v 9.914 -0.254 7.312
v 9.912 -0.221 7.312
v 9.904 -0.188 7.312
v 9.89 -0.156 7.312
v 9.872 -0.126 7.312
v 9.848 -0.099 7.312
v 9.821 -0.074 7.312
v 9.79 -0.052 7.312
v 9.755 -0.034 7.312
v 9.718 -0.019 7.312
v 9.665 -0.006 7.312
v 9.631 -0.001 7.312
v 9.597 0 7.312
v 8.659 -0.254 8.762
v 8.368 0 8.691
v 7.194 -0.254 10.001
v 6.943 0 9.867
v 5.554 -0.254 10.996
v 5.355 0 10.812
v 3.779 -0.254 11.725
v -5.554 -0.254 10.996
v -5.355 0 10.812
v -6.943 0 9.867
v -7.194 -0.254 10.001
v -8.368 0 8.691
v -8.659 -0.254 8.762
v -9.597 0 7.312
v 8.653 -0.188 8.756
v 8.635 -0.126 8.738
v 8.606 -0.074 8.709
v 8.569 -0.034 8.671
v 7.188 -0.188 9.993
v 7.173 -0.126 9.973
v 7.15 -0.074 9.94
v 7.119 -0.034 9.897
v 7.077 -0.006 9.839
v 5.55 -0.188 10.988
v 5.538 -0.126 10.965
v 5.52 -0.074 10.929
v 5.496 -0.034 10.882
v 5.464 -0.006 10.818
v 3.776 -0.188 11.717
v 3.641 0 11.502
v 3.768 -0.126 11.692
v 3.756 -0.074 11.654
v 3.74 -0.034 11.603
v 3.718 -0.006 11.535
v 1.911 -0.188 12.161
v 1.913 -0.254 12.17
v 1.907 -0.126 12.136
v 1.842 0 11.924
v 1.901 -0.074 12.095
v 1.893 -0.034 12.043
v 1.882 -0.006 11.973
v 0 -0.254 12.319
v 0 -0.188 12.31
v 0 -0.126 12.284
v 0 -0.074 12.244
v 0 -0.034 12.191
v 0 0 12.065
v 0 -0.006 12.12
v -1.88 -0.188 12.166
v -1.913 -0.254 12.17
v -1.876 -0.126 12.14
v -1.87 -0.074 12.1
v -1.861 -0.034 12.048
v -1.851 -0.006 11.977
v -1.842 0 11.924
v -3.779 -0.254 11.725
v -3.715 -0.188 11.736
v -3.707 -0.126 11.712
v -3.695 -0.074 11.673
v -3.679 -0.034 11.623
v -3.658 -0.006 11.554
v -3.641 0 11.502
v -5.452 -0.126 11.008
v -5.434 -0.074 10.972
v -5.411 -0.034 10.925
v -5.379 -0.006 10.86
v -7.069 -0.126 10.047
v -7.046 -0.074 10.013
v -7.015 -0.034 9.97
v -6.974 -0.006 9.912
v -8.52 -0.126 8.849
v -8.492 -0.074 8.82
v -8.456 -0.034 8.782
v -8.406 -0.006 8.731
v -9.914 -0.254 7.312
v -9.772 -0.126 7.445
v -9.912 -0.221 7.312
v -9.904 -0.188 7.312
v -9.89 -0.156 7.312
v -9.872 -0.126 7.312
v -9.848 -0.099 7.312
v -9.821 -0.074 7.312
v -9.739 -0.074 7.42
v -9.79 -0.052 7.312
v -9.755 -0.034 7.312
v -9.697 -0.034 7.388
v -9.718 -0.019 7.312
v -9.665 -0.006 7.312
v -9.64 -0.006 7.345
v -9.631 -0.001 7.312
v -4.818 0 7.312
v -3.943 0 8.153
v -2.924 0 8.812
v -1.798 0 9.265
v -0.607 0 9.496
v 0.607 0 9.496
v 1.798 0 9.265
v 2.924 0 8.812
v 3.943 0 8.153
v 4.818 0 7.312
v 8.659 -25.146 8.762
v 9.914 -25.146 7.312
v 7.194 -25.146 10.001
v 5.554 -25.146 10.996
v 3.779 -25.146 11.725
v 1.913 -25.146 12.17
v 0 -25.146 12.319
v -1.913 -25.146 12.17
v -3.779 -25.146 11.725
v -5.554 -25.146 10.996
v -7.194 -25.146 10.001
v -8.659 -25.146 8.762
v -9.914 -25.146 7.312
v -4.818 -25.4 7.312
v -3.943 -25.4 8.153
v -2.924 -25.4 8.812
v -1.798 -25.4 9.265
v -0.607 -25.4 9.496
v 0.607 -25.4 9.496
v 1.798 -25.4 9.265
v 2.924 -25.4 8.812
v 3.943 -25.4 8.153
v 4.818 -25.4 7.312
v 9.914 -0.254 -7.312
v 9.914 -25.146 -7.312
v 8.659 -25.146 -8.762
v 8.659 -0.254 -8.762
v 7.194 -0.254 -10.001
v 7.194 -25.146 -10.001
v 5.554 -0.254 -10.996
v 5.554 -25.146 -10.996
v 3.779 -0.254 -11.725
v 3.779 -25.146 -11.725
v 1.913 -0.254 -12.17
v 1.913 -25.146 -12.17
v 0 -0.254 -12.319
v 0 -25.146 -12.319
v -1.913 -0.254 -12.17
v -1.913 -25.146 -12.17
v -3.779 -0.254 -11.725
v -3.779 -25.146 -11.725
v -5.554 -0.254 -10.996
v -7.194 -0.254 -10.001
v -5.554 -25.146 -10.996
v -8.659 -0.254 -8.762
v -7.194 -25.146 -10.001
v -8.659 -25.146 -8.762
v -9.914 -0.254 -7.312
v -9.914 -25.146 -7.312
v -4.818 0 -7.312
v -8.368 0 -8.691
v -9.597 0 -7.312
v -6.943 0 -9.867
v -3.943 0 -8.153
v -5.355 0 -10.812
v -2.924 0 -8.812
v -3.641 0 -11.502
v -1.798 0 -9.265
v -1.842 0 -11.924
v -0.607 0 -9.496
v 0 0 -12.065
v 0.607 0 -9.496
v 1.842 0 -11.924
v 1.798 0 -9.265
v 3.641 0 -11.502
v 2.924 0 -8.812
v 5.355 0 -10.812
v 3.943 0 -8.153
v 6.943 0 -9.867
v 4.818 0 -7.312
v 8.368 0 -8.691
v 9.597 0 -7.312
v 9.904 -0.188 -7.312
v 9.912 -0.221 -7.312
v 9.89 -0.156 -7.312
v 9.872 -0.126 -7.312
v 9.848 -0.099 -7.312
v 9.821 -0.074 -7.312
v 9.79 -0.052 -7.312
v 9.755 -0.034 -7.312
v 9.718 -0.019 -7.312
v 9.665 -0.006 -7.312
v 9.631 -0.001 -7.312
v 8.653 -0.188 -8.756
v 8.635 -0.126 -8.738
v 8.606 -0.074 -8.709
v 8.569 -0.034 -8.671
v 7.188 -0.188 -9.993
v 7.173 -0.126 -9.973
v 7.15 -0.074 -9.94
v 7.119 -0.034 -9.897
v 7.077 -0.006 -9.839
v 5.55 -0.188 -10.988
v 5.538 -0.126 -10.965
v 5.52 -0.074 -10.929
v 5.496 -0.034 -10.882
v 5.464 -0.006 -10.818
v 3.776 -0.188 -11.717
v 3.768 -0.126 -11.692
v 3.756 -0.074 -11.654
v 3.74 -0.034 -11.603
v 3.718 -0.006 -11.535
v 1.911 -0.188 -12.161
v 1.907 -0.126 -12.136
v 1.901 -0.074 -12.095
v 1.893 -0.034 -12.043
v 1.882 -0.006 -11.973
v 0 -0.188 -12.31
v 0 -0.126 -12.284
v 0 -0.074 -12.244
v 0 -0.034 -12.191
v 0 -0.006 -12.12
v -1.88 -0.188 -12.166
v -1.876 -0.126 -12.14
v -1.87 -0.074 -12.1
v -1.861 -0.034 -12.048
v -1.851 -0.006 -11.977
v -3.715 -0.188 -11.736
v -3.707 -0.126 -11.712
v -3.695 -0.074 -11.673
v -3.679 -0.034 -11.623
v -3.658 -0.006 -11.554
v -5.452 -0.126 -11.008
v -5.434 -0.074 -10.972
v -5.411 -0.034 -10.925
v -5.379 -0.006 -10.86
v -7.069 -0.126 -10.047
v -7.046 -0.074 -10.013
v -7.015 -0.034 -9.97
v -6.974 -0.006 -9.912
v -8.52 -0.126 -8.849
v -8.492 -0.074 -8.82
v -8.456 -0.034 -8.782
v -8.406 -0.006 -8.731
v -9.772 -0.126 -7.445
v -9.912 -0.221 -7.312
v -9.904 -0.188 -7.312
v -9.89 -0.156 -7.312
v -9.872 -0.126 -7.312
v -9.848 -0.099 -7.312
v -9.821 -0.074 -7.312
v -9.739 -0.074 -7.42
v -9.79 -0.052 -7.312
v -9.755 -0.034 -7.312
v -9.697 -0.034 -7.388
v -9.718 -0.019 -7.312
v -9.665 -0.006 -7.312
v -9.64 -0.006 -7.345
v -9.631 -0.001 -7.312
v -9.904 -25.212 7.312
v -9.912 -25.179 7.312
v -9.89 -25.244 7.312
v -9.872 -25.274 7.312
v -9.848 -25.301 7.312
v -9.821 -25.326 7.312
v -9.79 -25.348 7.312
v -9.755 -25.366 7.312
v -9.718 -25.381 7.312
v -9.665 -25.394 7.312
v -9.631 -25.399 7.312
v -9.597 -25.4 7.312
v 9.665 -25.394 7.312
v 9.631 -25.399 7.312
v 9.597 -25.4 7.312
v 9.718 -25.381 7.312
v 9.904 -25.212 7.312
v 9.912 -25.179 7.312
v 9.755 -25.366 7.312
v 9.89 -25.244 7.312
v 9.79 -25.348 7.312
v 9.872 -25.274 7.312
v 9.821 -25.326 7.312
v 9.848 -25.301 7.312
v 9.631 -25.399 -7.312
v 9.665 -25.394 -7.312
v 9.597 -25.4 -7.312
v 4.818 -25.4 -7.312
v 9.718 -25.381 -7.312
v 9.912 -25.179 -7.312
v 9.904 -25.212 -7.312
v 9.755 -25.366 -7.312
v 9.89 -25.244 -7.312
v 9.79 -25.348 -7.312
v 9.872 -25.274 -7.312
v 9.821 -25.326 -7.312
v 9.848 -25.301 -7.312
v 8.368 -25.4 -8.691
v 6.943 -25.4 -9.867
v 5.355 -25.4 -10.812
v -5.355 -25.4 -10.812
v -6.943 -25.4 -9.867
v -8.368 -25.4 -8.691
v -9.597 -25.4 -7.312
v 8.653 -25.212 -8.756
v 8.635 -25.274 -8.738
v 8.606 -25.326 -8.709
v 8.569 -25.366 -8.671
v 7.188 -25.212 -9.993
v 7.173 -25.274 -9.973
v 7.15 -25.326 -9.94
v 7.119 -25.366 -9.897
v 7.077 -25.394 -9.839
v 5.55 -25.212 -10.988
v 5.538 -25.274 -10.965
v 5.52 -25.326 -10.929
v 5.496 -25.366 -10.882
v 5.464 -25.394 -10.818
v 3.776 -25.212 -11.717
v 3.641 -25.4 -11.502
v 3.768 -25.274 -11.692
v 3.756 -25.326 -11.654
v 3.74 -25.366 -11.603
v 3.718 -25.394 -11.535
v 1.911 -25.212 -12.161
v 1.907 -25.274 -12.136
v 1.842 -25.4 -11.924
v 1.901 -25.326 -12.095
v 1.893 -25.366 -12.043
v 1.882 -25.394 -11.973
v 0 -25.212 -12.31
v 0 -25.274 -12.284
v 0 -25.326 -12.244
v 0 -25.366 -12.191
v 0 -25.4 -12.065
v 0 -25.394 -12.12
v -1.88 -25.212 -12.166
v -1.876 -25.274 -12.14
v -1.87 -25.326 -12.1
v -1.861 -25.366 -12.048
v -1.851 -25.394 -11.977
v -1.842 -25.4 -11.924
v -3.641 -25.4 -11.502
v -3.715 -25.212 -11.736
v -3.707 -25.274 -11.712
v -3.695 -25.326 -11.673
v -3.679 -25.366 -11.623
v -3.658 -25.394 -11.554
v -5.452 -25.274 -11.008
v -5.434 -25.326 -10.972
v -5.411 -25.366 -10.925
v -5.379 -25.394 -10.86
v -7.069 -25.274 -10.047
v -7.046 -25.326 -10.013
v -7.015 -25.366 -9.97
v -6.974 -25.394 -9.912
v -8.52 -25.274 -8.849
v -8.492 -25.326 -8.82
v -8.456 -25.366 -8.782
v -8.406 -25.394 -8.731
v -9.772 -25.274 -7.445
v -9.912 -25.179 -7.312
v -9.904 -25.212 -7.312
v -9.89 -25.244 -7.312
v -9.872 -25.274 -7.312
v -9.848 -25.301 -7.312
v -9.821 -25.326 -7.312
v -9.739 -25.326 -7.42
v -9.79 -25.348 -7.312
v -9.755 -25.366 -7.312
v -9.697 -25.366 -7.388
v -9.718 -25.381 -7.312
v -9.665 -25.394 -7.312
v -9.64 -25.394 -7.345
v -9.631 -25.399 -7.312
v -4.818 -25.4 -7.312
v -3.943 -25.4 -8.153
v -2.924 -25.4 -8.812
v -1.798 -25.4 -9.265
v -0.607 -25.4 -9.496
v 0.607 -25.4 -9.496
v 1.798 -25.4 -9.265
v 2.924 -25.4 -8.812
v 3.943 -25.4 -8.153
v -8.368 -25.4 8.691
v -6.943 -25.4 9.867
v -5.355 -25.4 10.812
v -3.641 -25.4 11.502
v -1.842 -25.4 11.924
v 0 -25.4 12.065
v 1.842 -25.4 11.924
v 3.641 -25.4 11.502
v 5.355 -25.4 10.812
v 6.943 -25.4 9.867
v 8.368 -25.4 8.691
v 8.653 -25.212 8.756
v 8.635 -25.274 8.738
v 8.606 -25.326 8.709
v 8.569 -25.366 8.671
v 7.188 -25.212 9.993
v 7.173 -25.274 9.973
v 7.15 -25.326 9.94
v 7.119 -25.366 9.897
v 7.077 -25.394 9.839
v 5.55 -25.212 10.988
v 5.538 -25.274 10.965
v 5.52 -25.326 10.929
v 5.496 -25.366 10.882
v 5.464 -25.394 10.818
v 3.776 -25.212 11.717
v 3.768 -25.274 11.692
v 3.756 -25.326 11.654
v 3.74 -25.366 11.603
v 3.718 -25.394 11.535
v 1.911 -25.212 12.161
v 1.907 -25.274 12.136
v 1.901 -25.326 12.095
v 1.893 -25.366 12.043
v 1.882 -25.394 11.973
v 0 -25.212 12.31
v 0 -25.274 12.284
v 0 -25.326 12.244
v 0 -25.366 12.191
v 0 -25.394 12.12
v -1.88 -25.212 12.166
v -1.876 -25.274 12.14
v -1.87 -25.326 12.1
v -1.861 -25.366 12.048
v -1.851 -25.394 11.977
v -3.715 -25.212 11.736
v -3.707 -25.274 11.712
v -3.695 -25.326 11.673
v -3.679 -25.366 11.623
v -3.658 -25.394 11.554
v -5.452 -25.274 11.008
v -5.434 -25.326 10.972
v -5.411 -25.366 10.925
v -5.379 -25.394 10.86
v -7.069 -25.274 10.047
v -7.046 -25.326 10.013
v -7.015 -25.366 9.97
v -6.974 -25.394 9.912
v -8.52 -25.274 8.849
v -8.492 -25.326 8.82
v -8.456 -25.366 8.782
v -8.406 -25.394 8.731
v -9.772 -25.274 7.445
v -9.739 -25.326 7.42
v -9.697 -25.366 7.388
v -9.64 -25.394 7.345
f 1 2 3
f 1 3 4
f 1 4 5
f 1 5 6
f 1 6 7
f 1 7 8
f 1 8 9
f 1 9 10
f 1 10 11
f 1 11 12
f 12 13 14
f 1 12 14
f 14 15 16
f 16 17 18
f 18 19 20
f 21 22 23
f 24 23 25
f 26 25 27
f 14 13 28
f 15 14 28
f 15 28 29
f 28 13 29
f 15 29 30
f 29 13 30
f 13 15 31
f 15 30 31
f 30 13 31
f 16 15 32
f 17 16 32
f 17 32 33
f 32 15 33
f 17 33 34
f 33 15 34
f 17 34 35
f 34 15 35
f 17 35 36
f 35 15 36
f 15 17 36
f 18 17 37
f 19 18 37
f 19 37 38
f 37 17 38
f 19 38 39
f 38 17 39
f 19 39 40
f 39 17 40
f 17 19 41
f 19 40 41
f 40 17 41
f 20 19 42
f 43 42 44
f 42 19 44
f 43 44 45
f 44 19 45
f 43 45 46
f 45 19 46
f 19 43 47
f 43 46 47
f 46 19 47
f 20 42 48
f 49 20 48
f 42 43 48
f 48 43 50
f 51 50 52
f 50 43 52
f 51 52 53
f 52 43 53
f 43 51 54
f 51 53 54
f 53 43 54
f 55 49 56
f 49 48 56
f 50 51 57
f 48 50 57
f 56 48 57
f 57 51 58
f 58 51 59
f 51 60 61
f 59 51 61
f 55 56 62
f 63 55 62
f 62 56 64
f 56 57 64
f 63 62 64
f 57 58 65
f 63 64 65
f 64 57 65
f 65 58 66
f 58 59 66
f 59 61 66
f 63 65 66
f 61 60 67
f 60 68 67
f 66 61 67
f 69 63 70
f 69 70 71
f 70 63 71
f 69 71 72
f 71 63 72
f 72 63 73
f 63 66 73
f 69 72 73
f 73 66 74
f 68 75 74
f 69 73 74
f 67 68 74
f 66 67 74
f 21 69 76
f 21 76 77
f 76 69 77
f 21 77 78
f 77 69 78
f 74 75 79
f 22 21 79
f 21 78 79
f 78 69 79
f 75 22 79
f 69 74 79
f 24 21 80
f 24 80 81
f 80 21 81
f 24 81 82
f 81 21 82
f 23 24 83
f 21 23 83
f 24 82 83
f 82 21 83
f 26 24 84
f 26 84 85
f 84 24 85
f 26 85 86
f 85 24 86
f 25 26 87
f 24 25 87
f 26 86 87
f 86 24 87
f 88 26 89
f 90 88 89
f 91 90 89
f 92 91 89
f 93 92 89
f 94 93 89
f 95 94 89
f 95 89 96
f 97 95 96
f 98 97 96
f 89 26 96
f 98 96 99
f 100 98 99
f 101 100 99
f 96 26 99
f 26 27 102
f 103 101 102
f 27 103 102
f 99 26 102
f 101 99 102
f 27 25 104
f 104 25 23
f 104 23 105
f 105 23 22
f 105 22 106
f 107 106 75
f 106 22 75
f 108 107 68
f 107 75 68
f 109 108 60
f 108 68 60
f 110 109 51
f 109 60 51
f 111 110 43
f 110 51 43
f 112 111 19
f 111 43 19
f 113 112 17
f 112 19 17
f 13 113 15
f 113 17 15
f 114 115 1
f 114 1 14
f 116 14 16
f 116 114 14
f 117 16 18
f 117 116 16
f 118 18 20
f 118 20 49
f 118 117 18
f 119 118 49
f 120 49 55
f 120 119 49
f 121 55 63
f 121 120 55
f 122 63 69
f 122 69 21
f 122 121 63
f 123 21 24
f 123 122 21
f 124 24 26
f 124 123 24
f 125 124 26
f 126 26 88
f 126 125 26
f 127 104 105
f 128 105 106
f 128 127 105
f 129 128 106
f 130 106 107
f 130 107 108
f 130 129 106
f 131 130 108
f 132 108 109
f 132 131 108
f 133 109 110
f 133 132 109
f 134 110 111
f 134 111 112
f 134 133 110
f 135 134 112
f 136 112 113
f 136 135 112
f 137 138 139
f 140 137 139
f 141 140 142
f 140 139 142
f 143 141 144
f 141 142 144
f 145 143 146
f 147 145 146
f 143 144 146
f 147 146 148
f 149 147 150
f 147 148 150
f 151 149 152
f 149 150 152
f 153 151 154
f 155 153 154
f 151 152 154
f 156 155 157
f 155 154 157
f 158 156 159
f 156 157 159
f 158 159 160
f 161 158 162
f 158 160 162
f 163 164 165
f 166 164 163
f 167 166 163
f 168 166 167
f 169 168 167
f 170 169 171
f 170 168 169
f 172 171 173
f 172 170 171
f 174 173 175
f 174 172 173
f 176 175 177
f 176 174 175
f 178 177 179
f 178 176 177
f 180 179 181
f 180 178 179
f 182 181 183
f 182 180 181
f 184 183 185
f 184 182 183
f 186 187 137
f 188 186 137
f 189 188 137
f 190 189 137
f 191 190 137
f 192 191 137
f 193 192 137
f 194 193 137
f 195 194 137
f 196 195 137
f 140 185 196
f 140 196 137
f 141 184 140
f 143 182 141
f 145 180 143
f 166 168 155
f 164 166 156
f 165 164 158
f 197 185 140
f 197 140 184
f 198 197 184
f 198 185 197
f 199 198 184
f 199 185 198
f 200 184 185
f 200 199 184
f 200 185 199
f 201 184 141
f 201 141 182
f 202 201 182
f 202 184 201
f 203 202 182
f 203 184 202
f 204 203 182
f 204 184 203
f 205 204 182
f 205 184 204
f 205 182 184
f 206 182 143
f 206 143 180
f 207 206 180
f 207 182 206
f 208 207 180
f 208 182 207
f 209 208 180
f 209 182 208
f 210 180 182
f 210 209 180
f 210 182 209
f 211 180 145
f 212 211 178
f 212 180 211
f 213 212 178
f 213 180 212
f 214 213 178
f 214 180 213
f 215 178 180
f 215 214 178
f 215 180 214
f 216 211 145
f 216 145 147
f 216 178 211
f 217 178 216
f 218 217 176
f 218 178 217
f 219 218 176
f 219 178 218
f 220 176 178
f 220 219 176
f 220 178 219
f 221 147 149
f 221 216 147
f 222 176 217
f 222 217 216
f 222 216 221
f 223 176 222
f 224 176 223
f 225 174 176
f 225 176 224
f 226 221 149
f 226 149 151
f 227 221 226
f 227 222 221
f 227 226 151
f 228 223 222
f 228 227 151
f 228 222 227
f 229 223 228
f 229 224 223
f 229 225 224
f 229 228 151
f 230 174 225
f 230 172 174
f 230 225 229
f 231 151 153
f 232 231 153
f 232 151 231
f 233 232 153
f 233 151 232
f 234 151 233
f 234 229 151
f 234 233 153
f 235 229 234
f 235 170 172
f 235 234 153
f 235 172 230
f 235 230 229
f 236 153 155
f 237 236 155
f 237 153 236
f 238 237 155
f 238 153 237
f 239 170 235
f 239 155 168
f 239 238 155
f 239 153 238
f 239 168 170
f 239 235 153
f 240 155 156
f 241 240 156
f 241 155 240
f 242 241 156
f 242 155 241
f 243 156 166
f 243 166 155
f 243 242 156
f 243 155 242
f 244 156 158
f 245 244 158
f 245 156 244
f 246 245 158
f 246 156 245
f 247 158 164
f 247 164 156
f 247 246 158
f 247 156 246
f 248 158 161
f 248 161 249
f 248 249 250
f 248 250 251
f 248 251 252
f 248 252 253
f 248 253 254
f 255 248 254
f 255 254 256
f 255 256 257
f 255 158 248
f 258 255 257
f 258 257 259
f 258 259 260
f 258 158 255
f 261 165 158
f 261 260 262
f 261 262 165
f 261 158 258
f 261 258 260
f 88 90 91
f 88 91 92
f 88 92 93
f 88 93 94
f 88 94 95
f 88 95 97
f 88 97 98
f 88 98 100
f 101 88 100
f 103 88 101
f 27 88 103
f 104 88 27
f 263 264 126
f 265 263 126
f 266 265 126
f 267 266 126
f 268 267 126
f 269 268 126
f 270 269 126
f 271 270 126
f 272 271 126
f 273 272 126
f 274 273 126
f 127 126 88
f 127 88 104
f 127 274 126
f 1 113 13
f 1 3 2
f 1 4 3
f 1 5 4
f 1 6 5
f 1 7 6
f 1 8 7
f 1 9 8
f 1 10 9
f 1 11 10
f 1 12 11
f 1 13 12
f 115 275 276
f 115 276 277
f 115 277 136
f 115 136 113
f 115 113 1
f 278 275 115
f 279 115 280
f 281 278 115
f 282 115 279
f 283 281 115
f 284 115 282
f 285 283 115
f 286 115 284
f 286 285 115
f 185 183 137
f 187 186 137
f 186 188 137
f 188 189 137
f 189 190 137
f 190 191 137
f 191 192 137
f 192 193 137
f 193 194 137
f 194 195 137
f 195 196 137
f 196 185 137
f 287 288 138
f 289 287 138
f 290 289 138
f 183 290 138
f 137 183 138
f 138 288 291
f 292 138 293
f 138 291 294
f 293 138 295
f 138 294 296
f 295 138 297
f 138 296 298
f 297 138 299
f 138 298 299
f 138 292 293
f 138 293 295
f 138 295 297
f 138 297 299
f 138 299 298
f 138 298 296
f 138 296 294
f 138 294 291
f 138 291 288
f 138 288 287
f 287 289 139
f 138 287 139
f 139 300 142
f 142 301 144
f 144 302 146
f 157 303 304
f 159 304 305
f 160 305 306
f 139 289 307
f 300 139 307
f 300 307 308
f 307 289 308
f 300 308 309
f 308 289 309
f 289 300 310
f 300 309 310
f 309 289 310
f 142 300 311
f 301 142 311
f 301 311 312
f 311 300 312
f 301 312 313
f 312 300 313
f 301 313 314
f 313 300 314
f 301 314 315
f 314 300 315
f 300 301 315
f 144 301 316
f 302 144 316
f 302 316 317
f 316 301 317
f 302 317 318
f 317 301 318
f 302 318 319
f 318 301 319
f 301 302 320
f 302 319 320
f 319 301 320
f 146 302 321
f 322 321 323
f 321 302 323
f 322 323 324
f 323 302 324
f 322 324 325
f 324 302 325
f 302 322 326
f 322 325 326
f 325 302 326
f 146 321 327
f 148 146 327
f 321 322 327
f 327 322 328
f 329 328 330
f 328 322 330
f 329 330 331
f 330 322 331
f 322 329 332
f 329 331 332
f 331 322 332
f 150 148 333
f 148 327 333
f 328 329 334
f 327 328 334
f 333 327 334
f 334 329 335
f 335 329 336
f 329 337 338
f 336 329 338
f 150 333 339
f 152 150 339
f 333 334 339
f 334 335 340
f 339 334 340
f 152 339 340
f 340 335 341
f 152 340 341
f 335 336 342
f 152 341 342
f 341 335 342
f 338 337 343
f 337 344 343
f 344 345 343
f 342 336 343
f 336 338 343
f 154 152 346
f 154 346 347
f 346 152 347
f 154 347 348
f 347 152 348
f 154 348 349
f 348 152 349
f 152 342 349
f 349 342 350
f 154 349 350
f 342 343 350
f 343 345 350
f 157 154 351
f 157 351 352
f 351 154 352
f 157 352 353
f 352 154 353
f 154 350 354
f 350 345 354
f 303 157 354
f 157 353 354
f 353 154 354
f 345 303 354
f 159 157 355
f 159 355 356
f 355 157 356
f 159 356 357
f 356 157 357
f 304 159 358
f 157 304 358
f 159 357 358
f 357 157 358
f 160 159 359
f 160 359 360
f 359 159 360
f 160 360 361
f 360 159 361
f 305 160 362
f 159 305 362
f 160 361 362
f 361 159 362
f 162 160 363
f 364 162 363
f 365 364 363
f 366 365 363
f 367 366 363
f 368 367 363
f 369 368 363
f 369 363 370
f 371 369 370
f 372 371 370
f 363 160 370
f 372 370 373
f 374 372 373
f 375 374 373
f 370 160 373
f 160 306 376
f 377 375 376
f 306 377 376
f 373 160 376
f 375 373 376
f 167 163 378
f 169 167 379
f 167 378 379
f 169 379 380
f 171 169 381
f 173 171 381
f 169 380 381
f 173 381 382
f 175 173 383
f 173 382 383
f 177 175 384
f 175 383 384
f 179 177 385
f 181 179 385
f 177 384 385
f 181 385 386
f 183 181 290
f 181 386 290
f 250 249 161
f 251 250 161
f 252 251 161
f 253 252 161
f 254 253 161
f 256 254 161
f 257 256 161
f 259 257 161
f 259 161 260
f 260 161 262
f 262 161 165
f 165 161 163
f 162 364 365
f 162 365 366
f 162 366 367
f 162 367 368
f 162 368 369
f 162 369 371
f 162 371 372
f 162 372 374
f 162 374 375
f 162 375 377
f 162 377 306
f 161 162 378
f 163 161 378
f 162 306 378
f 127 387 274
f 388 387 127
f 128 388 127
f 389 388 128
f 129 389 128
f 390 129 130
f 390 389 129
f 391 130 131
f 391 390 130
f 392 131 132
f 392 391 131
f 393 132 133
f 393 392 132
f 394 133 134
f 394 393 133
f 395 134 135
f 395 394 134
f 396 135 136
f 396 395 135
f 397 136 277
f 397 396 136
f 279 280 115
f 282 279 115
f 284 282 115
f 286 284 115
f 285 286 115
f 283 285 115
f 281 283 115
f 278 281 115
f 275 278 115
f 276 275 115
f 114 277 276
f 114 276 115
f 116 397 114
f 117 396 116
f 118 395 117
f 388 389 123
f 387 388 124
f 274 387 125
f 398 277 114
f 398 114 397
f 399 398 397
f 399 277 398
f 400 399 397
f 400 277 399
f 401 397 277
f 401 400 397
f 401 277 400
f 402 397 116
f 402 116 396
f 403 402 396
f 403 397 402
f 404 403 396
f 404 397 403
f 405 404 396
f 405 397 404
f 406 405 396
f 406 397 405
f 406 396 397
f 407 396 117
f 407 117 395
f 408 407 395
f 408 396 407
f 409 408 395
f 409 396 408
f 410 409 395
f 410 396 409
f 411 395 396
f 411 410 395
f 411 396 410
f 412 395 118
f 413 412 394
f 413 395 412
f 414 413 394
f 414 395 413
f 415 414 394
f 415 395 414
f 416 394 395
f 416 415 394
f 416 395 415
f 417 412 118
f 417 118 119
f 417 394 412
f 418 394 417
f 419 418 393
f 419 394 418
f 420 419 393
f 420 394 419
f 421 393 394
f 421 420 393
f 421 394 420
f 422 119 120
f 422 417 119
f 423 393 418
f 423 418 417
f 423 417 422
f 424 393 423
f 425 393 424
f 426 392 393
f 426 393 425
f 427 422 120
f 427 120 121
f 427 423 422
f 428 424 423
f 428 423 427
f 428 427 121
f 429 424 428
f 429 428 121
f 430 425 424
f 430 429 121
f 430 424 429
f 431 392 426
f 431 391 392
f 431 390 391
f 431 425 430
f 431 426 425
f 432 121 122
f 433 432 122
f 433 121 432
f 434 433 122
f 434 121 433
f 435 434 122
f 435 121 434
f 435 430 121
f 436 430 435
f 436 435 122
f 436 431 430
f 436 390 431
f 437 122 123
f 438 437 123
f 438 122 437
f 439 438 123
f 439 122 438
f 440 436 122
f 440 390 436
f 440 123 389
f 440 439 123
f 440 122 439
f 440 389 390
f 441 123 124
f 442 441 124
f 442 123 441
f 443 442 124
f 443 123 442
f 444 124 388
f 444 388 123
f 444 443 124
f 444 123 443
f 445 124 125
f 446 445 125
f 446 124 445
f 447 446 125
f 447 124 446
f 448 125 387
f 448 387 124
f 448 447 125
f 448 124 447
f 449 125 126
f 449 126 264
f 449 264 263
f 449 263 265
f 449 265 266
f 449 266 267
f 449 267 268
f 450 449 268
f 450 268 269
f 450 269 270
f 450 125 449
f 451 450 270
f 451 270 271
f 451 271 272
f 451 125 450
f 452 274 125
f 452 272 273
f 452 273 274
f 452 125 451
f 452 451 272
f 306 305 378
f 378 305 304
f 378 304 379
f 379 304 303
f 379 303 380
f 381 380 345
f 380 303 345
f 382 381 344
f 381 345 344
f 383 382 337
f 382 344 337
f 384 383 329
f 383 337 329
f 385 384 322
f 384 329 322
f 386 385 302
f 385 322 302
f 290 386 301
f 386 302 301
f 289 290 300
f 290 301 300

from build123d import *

# Parameters (mm, degrees)
F0_R     = 12.319
F1_DEPTH = 25.4
F3_DEPTH = 25.4
F5_R     = 0.254
F5_2_R   = 0.254


with BuildPart() as f1:
    # F0 (on Front) → F1 (new body)
    with BuildSketch(Plane.XZ):
        Circle(F0_R)
    extrude(amount=F1_DEPTH)

    # F2 (on face) → F3 (intersect)
    with BuildSketch(Plane.XZ.offset(25.4)):
        with BuildLine():
            Line((4.8176888147, 7.3117105875), (9.9144666667, 7.3117105875))
            ThreePointArc((9.9144666667, 7.3117105875), (0, 12.319), (-9.9144666667, 7.3117105875))
            Line((-9.9144666667, 7.3117105875), (-4.8176888147, 7.3117105875))
            ThreePointArc((-4.8176888147, 7.3117105875), (0, 9.525), (4.8176888147, 7.3117105875))
        make_face()
    extrude(amount=-F3_DEPTH, mode=Mode.INTERSECT)


with BuildPart() as f4_1:
    # F4: instance of F1
    add(f1.part.mirror(Plane.XY))

    # F5#2
    f5_2_edges = [f4_1.edges().sort_by_distance(p)[0] for p in [
        (0, -25.4, -12.319),
        (0, 0, -12.319),
    ]]
    fillet(f5_2_edges, radius=F5_2_R)


with BuildPart() as f1_1:
    add(f1.part)

    # F5
    f5_edges = [f1_1.edges().sort_by_distance(p)[0] for p in [
        (0, -25.4, 12.319),
        (0, 0, 12.319),
    ]]
    fillet(f5_edges, radius=F5_R)


solid = Compound([f4_1.part, f1_1.part])
